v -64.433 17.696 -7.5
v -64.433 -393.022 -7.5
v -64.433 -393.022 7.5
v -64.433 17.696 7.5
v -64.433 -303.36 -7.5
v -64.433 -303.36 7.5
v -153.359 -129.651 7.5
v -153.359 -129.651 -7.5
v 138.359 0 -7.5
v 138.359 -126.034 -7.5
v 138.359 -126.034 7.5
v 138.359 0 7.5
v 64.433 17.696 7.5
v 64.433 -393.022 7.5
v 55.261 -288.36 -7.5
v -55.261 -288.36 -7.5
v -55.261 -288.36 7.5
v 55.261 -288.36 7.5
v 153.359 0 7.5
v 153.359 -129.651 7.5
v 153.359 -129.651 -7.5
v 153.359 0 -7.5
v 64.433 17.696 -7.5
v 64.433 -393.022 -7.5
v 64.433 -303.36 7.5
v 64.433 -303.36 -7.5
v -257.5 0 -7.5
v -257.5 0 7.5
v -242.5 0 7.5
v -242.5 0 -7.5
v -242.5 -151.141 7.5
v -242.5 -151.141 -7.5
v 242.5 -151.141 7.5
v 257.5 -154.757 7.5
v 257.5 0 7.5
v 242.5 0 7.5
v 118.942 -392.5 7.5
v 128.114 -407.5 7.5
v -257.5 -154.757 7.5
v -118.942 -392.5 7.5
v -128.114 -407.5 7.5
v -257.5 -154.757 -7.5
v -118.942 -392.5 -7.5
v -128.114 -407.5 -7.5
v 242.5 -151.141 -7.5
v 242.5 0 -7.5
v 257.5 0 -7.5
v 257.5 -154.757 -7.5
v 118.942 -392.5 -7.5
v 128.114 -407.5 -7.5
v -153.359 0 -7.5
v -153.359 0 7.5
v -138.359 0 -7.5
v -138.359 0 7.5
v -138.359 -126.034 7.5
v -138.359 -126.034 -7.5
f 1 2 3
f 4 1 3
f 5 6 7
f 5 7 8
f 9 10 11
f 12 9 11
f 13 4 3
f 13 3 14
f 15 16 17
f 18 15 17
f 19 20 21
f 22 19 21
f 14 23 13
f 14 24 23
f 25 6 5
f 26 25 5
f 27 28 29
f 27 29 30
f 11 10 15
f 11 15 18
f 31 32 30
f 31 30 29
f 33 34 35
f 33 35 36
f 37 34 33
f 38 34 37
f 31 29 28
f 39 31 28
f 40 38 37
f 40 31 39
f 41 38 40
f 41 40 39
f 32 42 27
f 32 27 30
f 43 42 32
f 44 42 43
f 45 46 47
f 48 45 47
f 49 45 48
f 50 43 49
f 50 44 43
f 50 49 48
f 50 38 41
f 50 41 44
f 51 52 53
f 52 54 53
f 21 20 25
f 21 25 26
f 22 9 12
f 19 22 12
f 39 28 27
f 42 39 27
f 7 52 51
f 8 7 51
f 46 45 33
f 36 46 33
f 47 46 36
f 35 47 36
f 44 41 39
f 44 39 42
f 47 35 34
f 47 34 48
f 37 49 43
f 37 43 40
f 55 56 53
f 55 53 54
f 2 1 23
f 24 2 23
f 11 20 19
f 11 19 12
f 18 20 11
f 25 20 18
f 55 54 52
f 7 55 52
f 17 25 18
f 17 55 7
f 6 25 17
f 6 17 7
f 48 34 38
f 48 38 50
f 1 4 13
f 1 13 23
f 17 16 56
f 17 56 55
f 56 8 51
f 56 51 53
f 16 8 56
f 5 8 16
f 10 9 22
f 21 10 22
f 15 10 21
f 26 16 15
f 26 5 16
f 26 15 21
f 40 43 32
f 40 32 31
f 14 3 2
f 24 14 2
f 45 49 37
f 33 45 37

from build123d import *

# Parameters (mm, degrees)
F1_W          = 15
F1_H          = 15
F3_DEPTH      = 89.662
F3_DEPTH_BACK = 321.056


with BuildPart() as f2:
    # F2: sweep along a path in F0
    with BuildLine(Plane.XY) as f2_path:
        Line((-249.9995, 0), (-249.9995, -152.9491841793))
        Line((-249.9995, -152.9491841793), (-123.5281899571, -400))
        Line((-123.5281899571, -400), (0, -400))
        Line((0, -400), (123.5281899571, -400))
        Line((123.5281899571, -400), (249.9995, -152.9491841793))
        Line((249.9995, -152.9491841793), (249.9995, 0))
    # F1 (on Front) → F2 (sweep)
    with BuildSketch(Plane.XZ):
        with Locations((-249.9995678663, 0)):
            Rectangle(F1_W, F1_H)
        with Locations((-145.8593010902, 0)):
            Rectangle(F1_W, F1_H)
    sweep(path=f2_path.line, transition=Transition.RIGHT)


with BuildPart() as f3:
    # F3 (new, two sides): a face of the model
    f3_faces = [f2.part.faces().sort_by_distance(p)[0] for p in [
        (0, -303.3598010902, 0),
    ]]
    extrude(f3_faces, amount=F3_DEPTH)
    extrude(f3_faces, amount=-F3_DEPTH_BACK)


solid = Compound([f2.part, f3.part])
